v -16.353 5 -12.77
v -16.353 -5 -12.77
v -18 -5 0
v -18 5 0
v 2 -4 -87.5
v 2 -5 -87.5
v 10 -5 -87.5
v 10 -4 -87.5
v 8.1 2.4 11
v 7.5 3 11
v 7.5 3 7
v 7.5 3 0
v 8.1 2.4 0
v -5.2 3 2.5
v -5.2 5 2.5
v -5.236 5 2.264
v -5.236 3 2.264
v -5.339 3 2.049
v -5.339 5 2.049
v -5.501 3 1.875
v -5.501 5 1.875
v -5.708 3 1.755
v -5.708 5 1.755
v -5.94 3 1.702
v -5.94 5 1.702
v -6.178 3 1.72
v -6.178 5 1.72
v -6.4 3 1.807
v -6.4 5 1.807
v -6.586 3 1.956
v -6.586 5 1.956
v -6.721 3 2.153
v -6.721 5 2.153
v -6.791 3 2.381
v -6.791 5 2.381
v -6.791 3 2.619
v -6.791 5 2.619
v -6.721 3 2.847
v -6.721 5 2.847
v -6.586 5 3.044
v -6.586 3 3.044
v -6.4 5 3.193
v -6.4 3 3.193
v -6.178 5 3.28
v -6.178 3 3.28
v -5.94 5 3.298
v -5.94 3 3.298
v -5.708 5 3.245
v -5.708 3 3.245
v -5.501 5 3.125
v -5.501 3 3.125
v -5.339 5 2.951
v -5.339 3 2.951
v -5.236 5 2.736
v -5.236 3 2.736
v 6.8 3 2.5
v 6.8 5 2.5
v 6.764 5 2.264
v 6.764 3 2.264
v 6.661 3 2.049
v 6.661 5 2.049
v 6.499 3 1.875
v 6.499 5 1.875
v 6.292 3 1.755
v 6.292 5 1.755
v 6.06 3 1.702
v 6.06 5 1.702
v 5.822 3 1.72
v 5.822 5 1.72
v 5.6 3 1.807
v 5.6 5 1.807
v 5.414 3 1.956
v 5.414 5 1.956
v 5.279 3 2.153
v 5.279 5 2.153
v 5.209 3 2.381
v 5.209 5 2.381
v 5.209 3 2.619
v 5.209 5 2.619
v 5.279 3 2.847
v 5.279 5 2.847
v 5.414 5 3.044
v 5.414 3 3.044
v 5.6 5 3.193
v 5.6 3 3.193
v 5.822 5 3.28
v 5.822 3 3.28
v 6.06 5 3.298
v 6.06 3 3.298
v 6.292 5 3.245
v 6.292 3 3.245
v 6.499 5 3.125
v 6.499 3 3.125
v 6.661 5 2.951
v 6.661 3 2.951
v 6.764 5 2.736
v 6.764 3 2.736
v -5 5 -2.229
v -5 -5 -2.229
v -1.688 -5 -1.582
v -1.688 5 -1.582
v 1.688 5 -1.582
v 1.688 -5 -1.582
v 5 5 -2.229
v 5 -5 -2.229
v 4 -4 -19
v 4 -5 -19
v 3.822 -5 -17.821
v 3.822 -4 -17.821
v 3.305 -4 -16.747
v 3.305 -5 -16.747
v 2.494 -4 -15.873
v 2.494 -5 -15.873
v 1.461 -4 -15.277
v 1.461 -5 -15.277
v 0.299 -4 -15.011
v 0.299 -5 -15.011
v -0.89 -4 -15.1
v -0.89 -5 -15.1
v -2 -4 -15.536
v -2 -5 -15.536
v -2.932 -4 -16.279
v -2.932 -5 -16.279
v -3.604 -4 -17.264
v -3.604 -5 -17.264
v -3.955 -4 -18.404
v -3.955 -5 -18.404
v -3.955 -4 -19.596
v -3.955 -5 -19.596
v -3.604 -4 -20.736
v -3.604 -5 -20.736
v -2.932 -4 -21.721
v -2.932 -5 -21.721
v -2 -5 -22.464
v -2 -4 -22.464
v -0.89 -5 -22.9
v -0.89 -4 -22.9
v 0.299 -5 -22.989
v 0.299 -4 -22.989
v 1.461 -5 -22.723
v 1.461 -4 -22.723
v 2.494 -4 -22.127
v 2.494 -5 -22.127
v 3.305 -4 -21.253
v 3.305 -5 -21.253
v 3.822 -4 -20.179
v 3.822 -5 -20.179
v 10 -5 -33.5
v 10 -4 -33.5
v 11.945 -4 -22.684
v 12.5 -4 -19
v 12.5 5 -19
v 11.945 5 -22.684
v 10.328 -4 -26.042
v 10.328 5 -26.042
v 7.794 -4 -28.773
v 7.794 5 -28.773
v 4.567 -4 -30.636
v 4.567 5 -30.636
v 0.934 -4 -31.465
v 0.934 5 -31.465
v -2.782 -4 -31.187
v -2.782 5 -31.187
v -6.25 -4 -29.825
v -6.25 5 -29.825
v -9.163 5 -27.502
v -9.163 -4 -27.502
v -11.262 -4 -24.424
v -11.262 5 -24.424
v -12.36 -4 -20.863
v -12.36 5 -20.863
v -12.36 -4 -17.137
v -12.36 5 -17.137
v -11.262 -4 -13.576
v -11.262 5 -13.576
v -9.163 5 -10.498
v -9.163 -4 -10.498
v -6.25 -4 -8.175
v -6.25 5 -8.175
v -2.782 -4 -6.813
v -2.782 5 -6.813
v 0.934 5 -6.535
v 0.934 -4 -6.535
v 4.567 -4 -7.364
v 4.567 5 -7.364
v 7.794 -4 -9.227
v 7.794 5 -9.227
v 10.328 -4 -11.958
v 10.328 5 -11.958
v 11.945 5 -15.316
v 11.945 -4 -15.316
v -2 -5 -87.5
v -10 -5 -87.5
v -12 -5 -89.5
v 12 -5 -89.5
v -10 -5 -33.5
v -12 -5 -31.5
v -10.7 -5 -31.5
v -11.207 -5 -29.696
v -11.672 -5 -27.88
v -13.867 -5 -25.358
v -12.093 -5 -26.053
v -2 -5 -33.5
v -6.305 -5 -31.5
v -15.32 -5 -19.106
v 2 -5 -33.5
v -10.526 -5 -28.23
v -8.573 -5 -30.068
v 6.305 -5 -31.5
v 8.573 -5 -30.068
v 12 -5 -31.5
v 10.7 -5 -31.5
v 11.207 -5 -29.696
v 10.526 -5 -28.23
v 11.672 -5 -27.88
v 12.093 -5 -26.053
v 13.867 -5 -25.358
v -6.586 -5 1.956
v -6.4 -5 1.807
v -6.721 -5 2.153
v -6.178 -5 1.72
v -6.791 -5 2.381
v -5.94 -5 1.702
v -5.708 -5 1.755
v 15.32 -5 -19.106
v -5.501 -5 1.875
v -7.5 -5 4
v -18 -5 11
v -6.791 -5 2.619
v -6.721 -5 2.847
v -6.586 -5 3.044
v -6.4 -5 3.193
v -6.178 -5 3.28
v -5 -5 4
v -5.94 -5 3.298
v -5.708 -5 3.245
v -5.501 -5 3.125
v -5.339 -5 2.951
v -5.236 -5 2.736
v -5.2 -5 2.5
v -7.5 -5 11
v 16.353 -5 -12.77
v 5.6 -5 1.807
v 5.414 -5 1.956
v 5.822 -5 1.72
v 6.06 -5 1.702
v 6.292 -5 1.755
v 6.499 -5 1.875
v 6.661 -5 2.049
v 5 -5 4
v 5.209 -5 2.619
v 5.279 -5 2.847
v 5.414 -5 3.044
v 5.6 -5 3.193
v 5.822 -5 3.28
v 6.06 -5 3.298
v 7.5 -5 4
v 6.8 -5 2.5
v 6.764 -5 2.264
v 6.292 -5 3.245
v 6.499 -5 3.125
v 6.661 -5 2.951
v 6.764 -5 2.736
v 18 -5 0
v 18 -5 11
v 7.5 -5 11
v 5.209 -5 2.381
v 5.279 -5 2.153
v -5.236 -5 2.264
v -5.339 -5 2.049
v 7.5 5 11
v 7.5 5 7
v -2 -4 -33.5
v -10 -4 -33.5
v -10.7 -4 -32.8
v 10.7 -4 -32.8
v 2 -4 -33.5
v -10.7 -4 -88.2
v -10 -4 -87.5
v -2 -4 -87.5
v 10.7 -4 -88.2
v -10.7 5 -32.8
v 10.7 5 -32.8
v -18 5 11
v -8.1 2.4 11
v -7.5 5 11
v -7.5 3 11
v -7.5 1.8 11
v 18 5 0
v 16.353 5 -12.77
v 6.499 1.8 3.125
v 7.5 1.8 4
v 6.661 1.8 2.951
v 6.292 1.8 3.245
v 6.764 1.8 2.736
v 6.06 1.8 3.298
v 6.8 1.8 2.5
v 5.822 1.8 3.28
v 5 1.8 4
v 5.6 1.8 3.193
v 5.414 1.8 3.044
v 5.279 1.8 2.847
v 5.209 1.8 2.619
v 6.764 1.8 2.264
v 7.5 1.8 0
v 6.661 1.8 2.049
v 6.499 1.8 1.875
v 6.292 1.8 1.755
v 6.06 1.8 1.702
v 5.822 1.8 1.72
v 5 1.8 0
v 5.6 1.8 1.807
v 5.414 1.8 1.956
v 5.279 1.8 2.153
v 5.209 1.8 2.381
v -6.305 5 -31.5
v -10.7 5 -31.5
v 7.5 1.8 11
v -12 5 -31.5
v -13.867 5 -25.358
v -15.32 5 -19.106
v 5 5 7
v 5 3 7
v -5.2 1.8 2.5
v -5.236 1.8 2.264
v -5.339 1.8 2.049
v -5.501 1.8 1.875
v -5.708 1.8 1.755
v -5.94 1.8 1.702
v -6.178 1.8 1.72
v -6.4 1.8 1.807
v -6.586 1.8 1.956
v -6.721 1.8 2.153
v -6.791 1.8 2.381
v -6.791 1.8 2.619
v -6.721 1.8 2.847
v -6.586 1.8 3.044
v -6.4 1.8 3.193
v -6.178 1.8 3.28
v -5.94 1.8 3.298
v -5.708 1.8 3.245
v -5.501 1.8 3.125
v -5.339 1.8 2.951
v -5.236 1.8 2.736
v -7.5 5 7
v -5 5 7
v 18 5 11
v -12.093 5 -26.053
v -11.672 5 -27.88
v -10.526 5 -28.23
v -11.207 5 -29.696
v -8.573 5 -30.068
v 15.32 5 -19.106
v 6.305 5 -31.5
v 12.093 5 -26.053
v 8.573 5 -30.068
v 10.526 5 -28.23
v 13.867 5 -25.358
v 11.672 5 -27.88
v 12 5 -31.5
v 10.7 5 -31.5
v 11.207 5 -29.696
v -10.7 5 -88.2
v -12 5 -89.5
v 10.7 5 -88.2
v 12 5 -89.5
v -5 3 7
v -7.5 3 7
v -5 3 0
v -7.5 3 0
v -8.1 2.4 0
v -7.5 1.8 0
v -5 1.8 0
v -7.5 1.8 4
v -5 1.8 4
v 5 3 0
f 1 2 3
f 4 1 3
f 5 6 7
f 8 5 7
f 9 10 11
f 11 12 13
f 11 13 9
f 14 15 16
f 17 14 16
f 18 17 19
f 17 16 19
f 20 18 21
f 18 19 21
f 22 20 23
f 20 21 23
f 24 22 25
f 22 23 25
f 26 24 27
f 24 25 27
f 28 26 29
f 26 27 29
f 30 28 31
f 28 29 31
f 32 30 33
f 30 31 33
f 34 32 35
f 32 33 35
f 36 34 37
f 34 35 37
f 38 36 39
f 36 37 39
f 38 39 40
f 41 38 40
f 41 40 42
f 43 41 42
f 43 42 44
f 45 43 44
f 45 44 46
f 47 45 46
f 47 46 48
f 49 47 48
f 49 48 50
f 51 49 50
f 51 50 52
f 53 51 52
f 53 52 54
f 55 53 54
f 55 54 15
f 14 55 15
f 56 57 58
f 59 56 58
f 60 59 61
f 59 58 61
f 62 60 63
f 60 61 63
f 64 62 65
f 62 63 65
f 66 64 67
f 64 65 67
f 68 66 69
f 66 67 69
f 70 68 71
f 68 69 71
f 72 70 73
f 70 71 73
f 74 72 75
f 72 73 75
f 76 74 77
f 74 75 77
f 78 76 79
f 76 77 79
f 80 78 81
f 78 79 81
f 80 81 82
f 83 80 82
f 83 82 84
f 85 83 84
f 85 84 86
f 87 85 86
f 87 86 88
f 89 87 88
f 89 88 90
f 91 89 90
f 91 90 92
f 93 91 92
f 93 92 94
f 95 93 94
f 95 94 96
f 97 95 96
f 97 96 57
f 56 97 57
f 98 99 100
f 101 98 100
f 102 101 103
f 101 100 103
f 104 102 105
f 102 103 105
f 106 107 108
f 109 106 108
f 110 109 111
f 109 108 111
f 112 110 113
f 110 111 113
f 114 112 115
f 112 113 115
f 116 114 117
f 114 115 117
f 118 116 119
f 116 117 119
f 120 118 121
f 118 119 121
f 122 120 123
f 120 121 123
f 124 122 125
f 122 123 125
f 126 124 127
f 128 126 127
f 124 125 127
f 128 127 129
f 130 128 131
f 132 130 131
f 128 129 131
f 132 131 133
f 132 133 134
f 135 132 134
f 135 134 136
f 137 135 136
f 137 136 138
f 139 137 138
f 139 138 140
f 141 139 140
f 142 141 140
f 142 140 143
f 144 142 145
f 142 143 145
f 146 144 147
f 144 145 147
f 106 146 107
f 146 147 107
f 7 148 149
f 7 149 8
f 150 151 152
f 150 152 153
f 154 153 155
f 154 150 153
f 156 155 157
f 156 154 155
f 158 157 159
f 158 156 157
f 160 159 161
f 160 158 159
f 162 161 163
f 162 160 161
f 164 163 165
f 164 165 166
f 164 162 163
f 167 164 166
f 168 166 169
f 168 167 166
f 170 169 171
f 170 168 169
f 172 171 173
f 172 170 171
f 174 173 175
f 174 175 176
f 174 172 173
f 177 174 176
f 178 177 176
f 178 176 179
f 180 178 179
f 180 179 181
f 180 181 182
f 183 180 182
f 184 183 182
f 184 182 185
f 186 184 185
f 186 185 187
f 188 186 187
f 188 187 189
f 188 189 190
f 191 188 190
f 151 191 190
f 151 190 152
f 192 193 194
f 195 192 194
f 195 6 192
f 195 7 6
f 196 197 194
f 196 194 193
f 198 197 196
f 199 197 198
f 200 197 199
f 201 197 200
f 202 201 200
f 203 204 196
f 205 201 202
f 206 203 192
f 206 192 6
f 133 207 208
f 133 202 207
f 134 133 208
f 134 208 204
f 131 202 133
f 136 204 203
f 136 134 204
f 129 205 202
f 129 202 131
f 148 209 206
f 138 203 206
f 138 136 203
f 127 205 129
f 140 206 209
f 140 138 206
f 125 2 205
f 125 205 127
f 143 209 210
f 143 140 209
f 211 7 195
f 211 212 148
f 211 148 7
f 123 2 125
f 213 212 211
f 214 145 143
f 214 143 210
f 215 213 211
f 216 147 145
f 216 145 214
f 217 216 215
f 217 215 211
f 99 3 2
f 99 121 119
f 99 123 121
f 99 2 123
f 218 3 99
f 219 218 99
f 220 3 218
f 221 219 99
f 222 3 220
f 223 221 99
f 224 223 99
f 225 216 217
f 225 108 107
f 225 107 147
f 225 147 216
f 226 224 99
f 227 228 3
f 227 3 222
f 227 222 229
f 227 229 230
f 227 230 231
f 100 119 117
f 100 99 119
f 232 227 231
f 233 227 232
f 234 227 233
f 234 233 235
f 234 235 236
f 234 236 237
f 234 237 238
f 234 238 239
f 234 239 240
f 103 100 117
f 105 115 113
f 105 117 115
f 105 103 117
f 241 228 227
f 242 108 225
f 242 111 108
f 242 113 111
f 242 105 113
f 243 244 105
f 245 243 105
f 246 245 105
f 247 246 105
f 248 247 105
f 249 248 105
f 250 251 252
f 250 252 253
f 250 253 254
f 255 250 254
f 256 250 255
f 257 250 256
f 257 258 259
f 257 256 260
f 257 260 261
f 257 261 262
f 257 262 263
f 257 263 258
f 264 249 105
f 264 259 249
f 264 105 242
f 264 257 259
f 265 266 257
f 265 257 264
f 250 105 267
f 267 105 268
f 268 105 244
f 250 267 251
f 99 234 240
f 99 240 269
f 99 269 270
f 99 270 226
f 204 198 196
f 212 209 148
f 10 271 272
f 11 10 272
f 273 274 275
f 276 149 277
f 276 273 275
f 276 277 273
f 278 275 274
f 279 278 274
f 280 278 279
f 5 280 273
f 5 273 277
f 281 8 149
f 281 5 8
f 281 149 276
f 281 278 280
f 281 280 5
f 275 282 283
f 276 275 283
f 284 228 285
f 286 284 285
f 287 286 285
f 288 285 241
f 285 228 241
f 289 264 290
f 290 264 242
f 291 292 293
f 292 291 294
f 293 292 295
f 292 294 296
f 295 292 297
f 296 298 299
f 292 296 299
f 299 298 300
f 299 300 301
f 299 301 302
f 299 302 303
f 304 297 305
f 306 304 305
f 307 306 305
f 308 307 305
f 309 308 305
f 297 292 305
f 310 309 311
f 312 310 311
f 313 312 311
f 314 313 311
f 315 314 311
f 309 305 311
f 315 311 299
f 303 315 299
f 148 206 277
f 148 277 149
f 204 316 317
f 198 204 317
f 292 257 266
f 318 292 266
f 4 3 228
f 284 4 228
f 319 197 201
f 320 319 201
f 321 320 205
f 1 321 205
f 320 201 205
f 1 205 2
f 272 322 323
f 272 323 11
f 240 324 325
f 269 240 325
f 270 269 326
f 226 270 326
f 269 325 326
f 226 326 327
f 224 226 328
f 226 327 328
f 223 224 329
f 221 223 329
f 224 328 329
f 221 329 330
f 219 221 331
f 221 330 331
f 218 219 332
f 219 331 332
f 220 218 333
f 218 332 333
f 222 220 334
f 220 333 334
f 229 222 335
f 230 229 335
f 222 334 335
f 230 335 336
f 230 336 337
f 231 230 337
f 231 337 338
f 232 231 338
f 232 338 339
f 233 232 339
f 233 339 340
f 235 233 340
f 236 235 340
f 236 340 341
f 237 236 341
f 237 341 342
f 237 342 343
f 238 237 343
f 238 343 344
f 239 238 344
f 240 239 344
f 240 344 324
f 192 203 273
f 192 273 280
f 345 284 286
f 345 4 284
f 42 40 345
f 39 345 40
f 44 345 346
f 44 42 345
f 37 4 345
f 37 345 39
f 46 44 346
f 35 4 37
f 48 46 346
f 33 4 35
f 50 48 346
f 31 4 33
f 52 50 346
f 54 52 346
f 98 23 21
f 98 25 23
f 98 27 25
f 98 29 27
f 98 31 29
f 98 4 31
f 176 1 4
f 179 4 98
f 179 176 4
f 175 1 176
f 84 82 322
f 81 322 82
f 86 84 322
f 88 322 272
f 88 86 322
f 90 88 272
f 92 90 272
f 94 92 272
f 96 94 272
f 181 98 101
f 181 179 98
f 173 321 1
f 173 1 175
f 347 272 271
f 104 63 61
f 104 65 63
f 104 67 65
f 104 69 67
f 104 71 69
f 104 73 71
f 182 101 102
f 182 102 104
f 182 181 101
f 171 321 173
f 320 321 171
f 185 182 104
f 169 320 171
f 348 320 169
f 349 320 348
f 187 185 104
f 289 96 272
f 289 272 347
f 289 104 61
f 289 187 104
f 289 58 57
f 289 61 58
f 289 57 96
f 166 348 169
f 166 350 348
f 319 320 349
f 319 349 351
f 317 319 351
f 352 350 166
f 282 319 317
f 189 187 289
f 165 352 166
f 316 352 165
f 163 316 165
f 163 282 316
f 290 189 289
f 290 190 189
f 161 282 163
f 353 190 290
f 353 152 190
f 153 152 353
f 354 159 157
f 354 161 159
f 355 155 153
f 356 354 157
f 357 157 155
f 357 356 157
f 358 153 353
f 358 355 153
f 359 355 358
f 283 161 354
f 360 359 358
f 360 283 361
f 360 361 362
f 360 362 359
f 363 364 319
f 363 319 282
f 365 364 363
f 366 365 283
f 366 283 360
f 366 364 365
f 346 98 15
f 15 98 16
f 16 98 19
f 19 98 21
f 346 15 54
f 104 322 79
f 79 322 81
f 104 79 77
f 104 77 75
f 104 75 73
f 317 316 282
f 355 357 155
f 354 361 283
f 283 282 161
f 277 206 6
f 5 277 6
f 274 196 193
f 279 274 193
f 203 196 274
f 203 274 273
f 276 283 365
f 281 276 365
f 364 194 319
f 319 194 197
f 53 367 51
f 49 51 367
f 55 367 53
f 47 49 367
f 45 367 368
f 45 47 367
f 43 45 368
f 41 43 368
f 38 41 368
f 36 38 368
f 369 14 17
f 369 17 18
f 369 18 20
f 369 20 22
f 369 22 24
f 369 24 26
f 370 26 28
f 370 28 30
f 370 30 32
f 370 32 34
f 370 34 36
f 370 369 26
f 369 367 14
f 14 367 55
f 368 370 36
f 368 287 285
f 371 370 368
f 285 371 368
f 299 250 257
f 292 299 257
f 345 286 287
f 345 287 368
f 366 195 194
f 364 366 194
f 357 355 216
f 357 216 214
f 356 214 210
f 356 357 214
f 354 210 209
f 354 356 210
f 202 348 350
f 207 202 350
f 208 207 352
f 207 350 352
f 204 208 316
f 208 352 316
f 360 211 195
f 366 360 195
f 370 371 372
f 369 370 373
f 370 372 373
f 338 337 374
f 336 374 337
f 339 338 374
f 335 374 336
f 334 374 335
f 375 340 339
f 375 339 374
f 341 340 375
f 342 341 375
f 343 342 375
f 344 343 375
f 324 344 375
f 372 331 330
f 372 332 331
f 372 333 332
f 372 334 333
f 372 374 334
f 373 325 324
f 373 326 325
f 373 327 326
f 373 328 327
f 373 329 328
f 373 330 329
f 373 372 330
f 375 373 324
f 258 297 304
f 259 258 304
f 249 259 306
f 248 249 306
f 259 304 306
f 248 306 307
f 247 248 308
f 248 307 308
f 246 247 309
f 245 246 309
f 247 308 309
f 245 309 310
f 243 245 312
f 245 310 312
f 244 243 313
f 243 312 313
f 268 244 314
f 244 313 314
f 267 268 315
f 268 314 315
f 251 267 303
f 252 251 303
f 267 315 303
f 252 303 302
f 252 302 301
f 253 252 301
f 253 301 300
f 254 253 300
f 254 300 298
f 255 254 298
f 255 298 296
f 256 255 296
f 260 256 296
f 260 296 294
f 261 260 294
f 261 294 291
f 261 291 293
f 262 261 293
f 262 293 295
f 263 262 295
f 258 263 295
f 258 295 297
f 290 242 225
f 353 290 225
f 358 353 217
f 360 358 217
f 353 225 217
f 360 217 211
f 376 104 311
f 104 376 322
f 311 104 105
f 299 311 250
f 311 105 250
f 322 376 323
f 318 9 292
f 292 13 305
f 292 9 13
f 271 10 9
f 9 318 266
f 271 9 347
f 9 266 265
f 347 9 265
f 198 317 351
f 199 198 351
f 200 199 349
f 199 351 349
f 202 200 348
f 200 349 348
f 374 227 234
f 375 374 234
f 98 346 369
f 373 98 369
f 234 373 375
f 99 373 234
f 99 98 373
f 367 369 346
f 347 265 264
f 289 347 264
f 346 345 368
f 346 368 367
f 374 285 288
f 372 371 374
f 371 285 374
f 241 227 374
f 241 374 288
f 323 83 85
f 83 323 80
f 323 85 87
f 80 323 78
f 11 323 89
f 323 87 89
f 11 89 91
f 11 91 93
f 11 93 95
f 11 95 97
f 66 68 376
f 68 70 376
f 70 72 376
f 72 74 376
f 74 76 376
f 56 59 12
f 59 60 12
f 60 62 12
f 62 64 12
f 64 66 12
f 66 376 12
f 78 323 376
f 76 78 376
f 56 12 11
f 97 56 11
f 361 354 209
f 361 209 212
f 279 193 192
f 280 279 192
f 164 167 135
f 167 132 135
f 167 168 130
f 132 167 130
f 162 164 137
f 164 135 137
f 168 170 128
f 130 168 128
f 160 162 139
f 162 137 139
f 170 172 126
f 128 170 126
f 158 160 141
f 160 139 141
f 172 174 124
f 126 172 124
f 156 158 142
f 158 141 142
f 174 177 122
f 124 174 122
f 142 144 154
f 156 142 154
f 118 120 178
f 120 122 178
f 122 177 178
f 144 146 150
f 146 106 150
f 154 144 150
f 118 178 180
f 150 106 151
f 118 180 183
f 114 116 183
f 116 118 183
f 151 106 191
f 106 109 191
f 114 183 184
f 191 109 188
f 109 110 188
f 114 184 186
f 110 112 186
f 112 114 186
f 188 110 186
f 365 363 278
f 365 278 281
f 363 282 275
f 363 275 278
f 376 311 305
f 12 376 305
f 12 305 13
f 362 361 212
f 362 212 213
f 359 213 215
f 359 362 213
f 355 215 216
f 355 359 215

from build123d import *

# Parameters (mm, degrees)
RESSALTO_EXTRUS_O1_DEPTH   = 11
RESSALTO_EXTRUS_O1_2_DEPTH = 11
RESSALTO_EXTRUS_O2_START   = -5
ESBO_O3_R                  = 12.5
ESBO_O3_W                  = 8
ESBO_O3_H                  = 54
RESSALTO_EXTRUS_O2_DEPTH   = 10
ESBO_O4_W                  = 21.4
ESBO_O4_H                  = 55.4
CORTE_EXTRUS_O1_DEPTH      = 9
CORTE_EXTRUS_O2_REACH      = 12
ESBO_O5_W                  = 2.5
ESBO_O5_H                  = 7
ESBO_O6_R                  = 0.8
ESBO_O6_W                  = 15
ESBO_O6_H                  = 4
CORTE_EXTRUS_O3_DEPTH      = 11
CORTE_EXTRUS_O4_DEPTH      = 1
CORTE_EXTRUS_O4_DEPTH_BACK = 11
ESBO_O10_R                 = 12.5
ESBO_O10_R_2               = 4
RESSALTO_EXTRUS_O3_DEPTH   = 1


with BuildPart() as part:
    # Esboço1 → Ressalto-extrusão1 (new body)
    with BuildSketch(Plane.XY):
        Polygon((-5, 1.8), (-5, -5), (-14.1, -5), (-14.1, 5), (-5, 5), (-5, 3), (-7.5, 3), (-8.1, 2.4), (-7.5, 1.8), align=None)
    extrude(amount=RESSALTO_EXTRUS_O1_DEPTH)



with BuildPart() as body_2:
    # Esboço1 → Ressalto-extrus_o1 2 (new body)
    with BuildSketch(Plane.XY):
        Polygon((7.5, 1.8), (5, 1.8), (5, -5), (14.1, -5), (14.1, 5), (5, 5), (5, 3), (7.5, 3), (8.1, 2.4), align=None)
    extrude(amount=RESSALTO_EXTRUS_O1_2_DEPTH)


with BuildPart() as part_1:
    add(part.part)

    add(body_2.part)  # Ressalto-extrusão2 merges body 2
    # Esboço3 → Ressalto-extrusão2 (add, through all)
    with BuildSketch(Plane(origin=(0, 0, 0), x_dir=(1, 0, 0), z_dir=(0, 1, 0)).offset(RESSALTO_EXTRUS_O2_START)):
        with BuildLine():
            Line((-14.1, -11), (-14.1, 0))
            Line((-14.1, 0), (-5, 0))
            Line((-5, 0), (-5, 2.229490169))
            ThreePointArc((-5, 2.229490169), (0, 1.5), (5, 2.229490169))
            Line((5, 2.229490169), (5, 0))
            Line((5, 0), (14.1, 0))
            Line((14.1, 0), (14.1, -11))
            Line((14.1, -11), (18, -11))
            Line((18, -11), (18, 0))
            Line((18, 0), (16.353425267, 12.769792778))
            ThreePointArc((16.353425267, 12.769792778), (14.646005419, 22.243973189), (12, 31.5))
            Line((12, 31.5), (12, 89.5))
            Line((12, 89.5), (-12, 89.5))
            Line((-12, 89.5), (-12, 31.5))
            ThreePointArc((-12, 31.5), (-14.646005419, 22.243973189), (-16.353425267, 12.769792778))
            Line((-16.353425267, 12.769792778), (-18, 0))
            Line((-18, 0), (-18, -11))
            Line((-18, -11), (-14.1, -11))
        make_face()
        with Locations((0, 19)):
            Circle(ESBO_O3_R, mode=Mode.SUBTRACT)
        with Locations((-6, 60.5)):
            Rectangle(ESBO_O3_W, ESBO_O3_H, mode=Mode.SUBTRACT)
        with Locations((6, 60.5)):
            Rectangle(ESBO_O3_W, ESBO_O3_H, mode=Mode.SUBTRACT)
    extrude(amount=RESSALTO_EXTRUS_O2_DEPTH)

    # Esboço4 → Corte-extrusão1 (cut)
    with BuildSketch(Plane(origin=(0, 5, 0), x_dir=(1, 0, 0), z_dir=(0, 1, 0))):
        with Locations((0, 60.5)):
            Rectangle(ESBO_O4_W, ESBO_O4_H)
    extrude(amount=-CORTE_EXTRUS_O1_DEPTH, mode=Mode.SUBTRACT)

    # Esboço5 → Corte-extrusão2 (cut, up to next)
    with BuildSketch(Plane.XZ.offset(5), mode=Mode.PRIVATE) as corte_extrus_o2_sk1:
        with Locations((-6.25, 7.5)):
            Rectangle(ESBO_O5_W, ESBO_O5_H)
    corte_extrus_o2_tool1 = extrude(corte_extrus_o2_sk1.sketch, amount=-CORTE_EXTRUS_O2_REACH, mode=Mode.PRIVATE) & part_1.part
    add(corte_extrus_o2_tool1.solids().sort_by_distance((-6.25, -5, 7.5))[0], mode=Mode.SUBTRACT)
    # Esboço5 → Corte-extrusão2 (cut, up to next)
    with BuildSketch(Plane.XZ.offset(5), mode=Mode.PRIVATE) as corte_extrus_o2_sk2:
        with Locations((6.25, 7.5)):
            Rectangle(ESBO_O5_W, ESBO_O5_H)
    corte_extrus_o2_tool2 = extrude(corte_extrus_o2_sk2.sketch, amount=-CORTE_EXTRUS_O2_REACH, mode=Mode.PRIVATE) & part_1.part
    add(corte_extrus_o2_tool2.solids().sort_by_distance((6.25, -5, 7.5))[0], mode=Mode.SUBTRACT)

    # Esboço6 → Corte-extrusão3 (cut, through all)
    with BuildSketch(Plane(origin=(0, 5, 0), x_dir=(1, 0, 0), z_dir=(0, 1, 0))):
        with Locations((-6, -2.5)):
            Circle(ESBO_O6_R)
        with Locations((6, -2.5)):
            Circle(ESBO_O6_R)
        with Locations((0, -9)):
            Rectangle(ESBO_O6_W, ESBO_O6_H)
    extrude(amount=-CORTE_EXTRUS_O3_DEPTH, mode=Mode.SUBTRACT)

    # Esboço9 → Corte-extrusão4 (cut, two sides)
    with BuildSketch(Plane(origin=(0, 5, 0), x_dir=(1, 0, 0), z_dir=(0, 1, 0))) as corte_extrus_o4_sk:
        with BuildLine():
            Line((6.304760106, 31.5), (10.7, 31.5))
            ThreePointArc((10.7, 31.5), (11.444665091, 28.788992569), (12.093349717, 26.053431266))
            ThreePointArc((12.093349717, 26.053431266), (9.593690062, 29.196132158), (6.304760106, 31.5))
        make_face()
        with BuildLine():
            Line((-6.304760106, 31.5), (-10.7, 31.5))
            ThreePointArc((-10.7, 31.5), (-11.444665091, 28.788992569), (-12.093349717, 26.053431266))
            ThreePointArc((-12.093349717, 26.053431266), (-9.593690062, 29.196132158), (-6.304760106, 31.5))
        make_face()
    extrude(amount=CORTE_EXTRUS_O4_DEPTH, mode=Mode.SUBTRACT)
    extrude(corte_extrus_o4_sk.sketch, amount=-CORTE_EXTRUS_O4_DEPTH_BACK, mode=Mode.SUBTRACT)

    # Esboço10 → Ressalto-extrusão3 (add)
    with BuildSketch(Plane.XZ.offset(5)):
        with Locations((0, -19)):
            Circle(ESBO_O10_R)
        with Locations((0, -19)):
            Circle(ESBO_O10_R_2, mode=Mode.SUBTRACT)
    extrude(amount=-RESSALTO_EXTRUS_O3_DEPTH)


solid = part_1.part
